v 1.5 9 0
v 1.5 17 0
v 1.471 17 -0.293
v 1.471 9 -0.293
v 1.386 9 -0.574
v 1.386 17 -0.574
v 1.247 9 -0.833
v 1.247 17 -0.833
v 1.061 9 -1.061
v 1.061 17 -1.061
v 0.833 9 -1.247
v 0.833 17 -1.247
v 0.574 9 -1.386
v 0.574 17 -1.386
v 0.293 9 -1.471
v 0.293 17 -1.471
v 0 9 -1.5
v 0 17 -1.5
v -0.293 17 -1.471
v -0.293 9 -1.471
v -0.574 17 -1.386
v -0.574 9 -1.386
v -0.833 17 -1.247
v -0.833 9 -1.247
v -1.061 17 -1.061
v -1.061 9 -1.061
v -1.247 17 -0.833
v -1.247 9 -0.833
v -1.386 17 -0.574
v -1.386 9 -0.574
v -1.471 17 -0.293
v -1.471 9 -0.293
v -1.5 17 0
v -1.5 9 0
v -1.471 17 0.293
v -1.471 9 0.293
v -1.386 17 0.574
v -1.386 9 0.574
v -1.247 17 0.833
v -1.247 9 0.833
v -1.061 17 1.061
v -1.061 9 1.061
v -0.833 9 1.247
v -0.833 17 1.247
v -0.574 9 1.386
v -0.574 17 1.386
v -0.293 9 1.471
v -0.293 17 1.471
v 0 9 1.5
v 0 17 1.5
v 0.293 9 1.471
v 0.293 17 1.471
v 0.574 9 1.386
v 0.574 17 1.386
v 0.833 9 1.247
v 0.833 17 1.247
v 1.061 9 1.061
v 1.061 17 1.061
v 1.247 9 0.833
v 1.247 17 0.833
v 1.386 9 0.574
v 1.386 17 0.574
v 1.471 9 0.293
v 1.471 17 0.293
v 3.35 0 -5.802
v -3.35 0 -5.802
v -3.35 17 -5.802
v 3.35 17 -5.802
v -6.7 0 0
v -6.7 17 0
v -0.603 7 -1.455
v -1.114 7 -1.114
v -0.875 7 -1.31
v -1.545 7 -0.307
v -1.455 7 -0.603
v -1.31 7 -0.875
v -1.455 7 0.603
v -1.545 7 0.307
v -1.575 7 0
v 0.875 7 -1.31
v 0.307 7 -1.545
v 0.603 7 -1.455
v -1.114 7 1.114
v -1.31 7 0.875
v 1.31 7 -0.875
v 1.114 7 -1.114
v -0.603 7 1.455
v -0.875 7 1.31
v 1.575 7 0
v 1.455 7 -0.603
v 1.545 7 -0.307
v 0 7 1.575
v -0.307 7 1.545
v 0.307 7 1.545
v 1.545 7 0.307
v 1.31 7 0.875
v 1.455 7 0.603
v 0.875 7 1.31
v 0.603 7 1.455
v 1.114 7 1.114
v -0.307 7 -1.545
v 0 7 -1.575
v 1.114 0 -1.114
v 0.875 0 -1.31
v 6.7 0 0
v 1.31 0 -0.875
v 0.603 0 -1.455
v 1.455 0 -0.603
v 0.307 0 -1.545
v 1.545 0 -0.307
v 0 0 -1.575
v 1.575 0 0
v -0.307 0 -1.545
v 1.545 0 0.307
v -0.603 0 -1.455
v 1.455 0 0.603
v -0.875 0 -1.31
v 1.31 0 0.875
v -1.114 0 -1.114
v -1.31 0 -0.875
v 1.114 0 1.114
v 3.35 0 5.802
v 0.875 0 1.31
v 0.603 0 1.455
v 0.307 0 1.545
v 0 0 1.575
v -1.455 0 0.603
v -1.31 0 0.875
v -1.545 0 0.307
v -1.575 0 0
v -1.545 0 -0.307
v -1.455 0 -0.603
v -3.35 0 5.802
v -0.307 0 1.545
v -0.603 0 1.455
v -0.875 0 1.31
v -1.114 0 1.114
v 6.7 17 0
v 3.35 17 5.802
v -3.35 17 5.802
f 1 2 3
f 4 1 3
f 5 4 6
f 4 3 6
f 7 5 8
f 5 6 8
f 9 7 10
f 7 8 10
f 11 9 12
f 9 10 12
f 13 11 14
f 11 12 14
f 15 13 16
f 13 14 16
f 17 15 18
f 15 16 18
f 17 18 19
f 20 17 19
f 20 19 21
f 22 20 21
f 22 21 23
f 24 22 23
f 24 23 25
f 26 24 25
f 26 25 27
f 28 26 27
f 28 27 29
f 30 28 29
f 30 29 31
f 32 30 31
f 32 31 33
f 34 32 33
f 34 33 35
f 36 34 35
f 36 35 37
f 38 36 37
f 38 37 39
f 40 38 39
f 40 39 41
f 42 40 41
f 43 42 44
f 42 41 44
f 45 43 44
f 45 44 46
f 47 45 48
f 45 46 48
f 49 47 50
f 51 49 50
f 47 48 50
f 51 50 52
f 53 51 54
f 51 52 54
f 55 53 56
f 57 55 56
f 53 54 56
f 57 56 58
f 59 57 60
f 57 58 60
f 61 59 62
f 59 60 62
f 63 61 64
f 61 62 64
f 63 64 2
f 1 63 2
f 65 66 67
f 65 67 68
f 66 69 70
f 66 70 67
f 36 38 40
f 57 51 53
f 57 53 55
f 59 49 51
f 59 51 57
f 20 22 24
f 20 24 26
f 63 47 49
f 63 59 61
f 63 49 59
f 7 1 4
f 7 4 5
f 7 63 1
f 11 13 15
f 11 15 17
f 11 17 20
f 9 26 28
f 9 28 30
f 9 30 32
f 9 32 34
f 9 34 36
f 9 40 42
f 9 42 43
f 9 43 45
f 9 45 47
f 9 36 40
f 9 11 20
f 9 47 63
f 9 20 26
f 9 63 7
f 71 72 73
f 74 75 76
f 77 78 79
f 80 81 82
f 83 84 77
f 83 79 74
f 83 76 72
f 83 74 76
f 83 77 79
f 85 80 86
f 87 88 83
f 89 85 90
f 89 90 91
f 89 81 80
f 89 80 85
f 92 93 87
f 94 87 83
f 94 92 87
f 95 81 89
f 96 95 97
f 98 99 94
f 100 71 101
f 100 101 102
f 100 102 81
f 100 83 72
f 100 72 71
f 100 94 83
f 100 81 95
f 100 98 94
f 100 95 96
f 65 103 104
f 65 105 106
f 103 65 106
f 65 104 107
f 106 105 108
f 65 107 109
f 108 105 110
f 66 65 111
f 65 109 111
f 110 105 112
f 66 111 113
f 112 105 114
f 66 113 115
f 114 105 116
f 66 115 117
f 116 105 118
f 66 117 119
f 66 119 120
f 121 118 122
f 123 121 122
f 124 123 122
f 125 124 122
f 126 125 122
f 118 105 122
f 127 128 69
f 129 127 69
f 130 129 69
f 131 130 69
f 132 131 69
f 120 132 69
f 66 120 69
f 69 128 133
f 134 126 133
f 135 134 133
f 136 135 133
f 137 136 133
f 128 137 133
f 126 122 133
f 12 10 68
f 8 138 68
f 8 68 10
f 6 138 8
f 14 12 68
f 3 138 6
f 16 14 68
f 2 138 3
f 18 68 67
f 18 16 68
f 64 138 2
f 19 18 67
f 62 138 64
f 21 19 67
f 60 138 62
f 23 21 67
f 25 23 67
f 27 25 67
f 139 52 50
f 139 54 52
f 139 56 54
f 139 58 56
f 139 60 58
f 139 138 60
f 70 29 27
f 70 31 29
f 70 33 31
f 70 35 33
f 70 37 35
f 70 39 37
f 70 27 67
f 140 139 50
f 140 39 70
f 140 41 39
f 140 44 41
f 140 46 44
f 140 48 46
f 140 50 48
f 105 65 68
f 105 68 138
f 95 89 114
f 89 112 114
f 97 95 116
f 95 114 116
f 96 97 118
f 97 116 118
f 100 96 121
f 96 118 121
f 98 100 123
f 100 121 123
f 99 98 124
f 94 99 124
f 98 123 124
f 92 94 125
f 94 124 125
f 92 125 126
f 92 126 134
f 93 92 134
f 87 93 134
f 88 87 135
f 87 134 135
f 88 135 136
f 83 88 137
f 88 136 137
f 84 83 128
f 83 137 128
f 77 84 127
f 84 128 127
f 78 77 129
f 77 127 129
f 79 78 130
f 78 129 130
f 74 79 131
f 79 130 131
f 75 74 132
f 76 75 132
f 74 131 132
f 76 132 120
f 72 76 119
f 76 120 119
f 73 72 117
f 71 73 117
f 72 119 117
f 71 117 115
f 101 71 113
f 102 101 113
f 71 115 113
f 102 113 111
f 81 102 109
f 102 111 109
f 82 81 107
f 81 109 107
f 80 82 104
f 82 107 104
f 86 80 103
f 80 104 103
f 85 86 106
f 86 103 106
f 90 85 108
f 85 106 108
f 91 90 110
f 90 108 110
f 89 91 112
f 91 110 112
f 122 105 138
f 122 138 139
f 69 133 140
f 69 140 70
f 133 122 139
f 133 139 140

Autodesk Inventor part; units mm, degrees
ref_plane "YZ Plane" through (0, 0, 0) normal (1, 0, 0) x (0, 1, 0)
ref_plane "XZ Plane" through (0, 0, 0) normal (0, 1, 0) x (-1, 0, 0)
ref_plane "XY Plane" through (0, 0, 0) normal (0, 0, 1) x (1, 0, 0)
sketch "Sketch1" plane through (0, 0, 0) normal (0, 1, 0) x (-1, 0, 0)
  line L0 (6.7, 0) -> (3.35, -5.8024)
  line L1 (3.35, -5.8024) -> (-3.35, -5.8024)
  line L2 (-3.35, -5.8024) -> (-6.7, 0)
  line L3 (-6.7, 0) -> (-3.35, 5.8024)
  line L4 (-3.35, 5.8024) -> (3.35, 5.8024)
  line L5 (3.35, 5.8024) -> (6.7, 0)
  point P0 (0, 0)
  dimension "d1" = 6.7
extrude "Extrusion1" add sketch "Sketch1" along normal blind 17
sketch "Sketch2" plane through (0, 17, 0) normal (0, 1, 0) x (1, 0, 0)
  circle A0 centre (0, 0) radius 1.25
  dimension "d4" = 2.5
extrude "Extrusion2" cut sketch "Sketch2" against normal blind 8
sketch "Sketch3" plane through (0, 17, 0) normal (0, 1, 0) x (1, 0, 0)
  circle A0 centre (0, 0) radius 1.5
  dimension "d10" = 3
extrude "Extrusion3" cut sketch "Sketch3" against normal blind 8
sketch "Sketch4" plane through (0, 0, 0) normal (0, -1, 0) x (1, 0, 0)
  circle A0 centre (0, 0) radius 1.575
  dimension "d14" = 3.15
extrude "Extrusion4" cut sketch "Sketch4" against normal blind 7
properties part number "BruteForceCoupler"
